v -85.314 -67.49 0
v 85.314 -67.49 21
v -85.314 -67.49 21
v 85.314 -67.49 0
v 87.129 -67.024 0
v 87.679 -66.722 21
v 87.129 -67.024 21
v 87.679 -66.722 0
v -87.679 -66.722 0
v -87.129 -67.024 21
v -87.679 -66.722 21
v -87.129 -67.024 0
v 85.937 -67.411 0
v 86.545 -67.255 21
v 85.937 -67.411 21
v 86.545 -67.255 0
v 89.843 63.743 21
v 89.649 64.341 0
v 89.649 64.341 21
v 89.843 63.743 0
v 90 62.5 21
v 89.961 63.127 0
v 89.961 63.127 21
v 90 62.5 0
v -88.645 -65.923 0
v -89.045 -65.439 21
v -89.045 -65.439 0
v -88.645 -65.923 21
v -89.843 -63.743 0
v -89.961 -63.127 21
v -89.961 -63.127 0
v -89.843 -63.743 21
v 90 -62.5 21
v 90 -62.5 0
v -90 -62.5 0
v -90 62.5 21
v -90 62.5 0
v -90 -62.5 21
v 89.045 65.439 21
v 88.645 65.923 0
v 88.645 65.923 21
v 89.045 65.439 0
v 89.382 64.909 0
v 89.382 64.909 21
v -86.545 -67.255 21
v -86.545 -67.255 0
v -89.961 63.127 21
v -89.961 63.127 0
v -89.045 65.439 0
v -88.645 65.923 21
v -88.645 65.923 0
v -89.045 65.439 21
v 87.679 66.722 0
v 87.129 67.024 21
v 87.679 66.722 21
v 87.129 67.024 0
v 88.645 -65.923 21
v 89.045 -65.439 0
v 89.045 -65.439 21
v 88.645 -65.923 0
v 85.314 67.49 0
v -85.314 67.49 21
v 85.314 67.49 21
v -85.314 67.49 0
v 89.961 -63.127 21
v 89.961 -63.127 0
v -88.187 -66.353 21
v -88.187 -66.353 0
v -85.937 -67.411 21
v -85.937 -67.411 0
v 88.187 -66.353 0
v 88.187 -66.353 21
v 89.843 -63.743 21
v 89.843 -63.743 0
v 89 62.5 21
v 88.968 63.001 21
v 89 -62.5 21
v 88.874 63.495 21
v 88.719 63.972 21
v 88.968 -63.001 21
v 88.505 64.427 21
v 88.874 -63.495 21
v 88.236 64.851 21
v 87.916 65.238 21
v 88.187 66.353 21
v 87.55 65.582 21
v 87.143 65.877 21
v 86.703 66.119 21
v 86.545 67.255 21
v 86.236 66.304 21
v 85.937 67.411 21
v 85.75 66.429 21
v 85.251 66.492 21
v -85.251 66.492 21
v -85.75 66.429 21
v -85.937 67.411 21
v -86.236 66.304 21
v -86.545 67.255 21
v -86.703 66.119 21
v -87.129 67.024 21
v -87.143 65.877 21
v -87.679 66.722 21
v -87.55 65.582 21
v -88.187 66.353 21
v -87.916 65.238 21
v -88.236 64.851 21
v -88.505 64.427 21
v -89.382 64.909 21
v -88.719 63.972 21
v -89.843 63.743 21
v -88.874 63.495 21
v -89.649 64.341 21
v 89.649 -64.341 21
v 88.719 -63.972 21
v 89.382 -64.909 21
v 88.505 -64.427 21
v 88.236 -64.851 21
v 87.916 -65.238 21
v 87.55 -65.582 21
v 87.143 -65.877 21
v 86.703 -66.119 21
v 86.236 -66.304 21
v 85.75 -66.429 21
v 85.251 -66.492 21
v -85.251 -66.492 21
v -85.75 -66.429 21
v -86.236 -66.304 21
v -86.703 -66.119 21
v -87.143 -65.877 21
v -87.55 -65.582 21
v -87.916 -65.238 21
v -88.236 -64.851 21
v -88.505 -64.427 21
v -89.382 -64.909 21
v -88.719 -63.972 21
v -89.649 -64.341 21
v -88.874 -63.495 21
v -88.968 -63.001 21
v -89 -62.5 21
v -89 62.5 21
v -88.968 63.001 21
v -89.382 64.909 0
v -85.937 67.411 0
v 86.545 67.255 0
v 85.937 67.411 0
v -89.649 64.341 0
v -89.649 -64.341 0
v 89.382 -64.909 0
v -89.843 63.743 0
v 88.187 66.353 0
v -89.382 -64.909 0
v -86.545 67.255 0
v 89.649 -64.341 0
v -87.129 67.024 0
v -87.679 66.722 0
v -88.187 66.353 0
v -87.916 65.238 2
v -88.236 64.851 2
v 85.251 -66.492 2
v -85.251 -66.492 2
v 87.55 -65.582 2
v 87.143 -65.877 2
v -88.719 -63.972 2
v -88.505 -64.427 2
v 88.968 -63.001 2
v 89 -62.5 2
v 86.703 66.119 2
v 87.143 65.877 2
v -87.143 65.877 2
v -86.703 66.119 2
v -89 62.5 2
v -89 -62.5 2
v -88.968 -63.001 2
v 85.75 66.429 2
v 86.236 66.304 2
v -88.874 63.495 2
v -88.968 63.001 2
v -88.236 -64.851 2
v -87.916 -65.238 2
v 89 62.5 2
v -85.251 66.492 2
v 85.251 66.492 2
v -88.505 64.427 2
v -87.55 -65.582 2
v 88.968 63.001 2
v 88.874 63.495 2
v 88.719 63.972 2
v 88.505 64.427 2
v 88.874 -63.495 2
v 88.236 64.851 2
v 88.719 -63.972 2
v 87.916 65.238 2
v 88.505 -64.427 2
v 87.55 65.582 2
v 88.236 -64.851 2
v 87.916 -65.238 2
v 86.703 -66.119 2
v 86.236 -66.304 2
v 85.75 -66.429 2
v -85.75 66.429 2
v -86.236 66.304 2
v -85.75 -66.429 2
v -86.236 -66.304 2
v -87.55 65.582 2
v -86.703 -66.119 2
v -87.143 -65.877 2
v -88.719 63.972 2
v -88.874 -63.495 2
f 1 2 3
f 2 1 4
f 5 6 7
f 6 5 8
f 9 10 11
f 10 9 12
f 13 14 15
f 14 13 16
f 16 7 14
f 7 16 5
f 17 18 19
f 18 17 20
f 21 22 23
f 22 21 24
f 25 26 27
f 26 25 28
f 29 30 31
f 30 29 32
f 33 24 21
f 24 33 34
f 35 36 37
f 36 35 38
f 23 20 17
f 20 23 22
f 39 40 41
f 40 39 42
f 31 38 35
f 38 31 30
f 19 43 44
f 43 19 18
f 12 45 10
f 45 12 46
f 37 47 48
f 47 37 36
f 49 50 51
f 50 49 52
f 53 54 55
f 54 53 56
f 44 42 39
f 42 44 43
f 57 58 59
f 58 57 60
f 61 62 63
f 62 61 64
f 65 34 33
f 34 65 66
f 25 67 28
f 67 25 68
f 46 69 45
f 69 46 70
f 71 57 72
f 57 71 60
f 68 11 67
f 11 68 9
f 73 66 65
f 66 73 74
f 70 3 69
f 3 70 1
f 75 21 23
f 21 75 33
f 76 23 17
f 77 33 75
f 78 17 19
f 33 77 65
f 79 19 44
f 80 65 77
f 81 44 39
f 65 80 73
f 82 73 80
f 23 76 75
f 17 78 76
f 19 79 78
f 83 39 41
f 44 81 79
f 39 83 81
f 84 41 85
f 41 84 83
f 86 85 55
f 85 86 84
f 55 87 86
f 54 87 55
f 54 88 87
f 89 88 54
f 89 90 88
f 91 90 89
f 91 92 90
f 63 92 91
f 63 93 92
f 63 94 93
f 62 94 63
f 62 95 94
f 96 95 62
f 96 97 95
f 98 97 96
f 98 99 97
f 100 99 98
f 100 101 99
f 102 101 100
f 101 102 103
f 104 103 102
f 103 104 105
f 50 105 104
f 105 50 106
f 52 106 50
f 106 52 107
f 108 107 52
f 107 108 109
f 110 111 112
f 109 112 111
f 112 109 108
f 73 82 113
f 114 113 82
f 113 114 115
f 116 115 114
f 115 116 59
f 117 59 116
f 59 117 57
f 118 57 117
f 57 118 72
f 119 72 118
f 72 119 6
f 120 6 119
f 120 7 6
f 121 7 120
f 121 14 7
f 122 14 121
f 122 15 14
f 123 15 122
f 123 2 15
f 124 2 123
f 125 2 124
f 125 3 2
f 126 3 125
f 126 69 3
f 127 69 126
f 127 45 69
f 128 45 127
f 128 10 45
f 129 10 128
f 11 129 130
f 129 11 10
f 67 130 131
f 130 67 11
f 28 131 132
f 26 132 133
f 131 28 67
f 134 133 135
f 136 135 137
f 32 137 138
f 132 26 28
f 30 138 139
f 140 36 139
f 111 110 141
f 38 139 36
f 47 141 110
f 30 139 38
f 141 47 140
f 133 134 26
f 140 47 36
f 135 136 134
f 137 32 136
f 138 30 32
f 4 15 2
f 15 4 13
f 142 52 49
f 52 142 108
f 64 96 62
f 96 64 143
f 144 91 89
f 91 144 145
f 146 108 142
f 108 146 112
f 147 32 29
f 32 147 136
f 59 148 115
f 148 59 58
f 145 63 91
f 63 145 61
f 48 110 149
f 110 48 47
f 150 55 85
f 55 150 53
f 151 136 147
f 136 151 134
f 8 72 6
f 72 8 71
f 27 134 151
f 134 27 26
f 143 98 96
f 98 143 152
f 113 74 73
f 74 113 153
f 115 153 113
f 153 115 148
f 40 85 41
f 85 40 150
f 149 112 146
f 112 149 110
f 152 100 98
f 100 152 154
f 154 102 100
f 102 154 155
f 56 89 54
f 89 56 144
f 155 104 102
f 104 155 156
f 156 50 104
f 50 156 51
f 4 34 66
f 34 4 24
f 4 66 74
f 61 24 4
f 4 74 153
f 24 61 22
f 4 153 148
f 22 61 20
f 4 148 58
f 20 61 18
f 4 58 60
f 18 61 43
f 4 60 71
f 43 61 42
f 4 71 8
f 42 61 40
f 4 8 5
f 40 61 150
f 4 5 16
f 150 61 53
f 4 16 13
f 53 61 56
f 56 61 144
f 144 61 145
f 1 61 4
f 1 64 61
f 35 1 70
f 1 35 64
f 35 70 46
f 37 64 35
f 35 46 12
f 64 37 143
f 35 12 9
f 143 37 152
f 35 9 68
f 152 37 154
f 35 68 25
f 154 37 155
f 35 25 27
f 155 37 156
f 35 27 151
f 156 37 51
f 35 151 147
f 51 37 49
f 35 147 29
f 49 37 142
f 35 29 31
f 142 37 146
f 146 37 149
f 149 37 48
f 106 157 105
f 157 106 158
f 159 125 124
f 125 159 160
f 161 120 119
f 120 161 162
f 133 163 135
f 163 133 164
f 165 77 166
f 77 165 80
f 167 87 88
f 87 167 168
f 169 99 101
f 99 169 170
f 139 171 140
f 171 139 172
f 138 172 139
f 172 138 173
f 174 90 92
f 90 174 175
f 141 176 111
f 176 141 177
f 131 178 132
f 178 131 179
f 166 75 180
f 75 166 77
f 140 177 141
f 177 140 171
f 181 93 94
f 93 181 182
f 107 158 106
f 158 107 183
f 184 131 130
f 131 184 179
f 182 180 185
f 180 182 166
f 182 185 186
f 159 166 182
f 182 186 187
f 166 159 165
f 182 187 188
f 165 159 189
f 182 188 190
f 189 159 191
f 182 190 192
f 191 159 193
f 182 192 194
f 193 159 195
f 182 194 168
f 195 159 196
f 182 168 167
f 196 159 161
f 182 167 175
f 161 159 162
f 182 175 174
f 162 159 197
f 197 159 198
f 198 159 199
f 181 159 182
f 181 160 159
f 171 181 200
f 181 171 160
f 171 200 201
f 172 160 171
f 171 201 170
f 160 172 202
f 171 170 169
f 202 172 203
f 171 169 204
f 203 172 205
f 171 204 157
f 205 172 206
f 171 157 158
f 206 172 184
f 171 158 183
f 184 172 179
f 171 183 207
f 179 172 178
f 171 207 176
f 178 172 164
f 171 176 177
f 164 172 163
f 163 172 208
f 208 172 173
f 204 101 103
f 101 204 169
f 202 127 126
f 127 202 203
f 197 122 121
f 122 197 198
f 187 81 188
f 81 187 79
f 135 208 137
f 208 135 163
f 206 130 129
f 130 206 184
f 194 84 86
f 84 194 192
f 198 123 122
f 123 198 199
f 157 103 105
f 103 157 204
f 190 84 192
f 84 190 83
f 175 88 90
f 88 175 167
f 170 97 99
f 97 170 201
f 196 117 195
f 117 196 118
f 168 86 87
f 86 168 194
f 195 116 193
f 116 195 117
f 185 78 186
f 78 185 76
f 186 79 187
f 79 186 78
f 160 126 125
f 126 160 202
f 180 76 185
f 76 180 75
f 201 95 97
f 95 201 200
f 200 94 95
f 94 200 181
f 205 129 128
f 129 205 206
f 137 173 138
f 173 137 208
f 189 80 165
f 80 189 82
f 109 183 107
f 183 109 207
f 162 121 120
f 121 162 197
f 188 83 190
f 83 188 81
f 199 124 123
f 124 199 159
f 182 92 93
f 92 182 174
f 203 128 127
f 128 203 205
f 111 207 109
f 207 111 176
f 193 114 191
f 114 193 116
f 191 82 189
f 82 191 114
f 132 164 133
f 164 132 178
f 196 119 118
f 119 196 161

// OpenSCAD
$fn = 50;


difference() {
	union() {
		hull() {
			translate(v = [-85.0000000000, 62.5000000000, 0]) {
				cylinder(h = 21, r = 5);
			}
			translate(v = [85.0000000000, 62.5000000000, 0]) {
				cylinder(h = 21, r = 5);
			}
			translate(v = [-85.0000000000, -62.5000000000, 0]) {
				cylinder(h = 21, r = 5);
			}
			translate(v = [85.0000000000, -62.5000000000, 0]) {
				cylinder(h = 21, r = 5);
			}
		}
	}
	union() {
		translate(v = [0, 0, 2]) {
			hull() {
				translate(v = [-85.0000000000, 62.5000000000, 0]) {
					cylinder(h = 19, r = 4);
				}
				translate(v = [85.0000000000, 62.5000000000, 0]) {
					cylinder(h = 19, r = 4);
				}
				translate(v = [-85.0000000000, -62.5000000000, 0]) {
					cylinder(h = 19, r = 4);
				}
				translate(v = [85.0000000000, -62.5000000000, 0]) {
					cylinder(h = 19, r = 4);
				}
			}
		}
	}
}
